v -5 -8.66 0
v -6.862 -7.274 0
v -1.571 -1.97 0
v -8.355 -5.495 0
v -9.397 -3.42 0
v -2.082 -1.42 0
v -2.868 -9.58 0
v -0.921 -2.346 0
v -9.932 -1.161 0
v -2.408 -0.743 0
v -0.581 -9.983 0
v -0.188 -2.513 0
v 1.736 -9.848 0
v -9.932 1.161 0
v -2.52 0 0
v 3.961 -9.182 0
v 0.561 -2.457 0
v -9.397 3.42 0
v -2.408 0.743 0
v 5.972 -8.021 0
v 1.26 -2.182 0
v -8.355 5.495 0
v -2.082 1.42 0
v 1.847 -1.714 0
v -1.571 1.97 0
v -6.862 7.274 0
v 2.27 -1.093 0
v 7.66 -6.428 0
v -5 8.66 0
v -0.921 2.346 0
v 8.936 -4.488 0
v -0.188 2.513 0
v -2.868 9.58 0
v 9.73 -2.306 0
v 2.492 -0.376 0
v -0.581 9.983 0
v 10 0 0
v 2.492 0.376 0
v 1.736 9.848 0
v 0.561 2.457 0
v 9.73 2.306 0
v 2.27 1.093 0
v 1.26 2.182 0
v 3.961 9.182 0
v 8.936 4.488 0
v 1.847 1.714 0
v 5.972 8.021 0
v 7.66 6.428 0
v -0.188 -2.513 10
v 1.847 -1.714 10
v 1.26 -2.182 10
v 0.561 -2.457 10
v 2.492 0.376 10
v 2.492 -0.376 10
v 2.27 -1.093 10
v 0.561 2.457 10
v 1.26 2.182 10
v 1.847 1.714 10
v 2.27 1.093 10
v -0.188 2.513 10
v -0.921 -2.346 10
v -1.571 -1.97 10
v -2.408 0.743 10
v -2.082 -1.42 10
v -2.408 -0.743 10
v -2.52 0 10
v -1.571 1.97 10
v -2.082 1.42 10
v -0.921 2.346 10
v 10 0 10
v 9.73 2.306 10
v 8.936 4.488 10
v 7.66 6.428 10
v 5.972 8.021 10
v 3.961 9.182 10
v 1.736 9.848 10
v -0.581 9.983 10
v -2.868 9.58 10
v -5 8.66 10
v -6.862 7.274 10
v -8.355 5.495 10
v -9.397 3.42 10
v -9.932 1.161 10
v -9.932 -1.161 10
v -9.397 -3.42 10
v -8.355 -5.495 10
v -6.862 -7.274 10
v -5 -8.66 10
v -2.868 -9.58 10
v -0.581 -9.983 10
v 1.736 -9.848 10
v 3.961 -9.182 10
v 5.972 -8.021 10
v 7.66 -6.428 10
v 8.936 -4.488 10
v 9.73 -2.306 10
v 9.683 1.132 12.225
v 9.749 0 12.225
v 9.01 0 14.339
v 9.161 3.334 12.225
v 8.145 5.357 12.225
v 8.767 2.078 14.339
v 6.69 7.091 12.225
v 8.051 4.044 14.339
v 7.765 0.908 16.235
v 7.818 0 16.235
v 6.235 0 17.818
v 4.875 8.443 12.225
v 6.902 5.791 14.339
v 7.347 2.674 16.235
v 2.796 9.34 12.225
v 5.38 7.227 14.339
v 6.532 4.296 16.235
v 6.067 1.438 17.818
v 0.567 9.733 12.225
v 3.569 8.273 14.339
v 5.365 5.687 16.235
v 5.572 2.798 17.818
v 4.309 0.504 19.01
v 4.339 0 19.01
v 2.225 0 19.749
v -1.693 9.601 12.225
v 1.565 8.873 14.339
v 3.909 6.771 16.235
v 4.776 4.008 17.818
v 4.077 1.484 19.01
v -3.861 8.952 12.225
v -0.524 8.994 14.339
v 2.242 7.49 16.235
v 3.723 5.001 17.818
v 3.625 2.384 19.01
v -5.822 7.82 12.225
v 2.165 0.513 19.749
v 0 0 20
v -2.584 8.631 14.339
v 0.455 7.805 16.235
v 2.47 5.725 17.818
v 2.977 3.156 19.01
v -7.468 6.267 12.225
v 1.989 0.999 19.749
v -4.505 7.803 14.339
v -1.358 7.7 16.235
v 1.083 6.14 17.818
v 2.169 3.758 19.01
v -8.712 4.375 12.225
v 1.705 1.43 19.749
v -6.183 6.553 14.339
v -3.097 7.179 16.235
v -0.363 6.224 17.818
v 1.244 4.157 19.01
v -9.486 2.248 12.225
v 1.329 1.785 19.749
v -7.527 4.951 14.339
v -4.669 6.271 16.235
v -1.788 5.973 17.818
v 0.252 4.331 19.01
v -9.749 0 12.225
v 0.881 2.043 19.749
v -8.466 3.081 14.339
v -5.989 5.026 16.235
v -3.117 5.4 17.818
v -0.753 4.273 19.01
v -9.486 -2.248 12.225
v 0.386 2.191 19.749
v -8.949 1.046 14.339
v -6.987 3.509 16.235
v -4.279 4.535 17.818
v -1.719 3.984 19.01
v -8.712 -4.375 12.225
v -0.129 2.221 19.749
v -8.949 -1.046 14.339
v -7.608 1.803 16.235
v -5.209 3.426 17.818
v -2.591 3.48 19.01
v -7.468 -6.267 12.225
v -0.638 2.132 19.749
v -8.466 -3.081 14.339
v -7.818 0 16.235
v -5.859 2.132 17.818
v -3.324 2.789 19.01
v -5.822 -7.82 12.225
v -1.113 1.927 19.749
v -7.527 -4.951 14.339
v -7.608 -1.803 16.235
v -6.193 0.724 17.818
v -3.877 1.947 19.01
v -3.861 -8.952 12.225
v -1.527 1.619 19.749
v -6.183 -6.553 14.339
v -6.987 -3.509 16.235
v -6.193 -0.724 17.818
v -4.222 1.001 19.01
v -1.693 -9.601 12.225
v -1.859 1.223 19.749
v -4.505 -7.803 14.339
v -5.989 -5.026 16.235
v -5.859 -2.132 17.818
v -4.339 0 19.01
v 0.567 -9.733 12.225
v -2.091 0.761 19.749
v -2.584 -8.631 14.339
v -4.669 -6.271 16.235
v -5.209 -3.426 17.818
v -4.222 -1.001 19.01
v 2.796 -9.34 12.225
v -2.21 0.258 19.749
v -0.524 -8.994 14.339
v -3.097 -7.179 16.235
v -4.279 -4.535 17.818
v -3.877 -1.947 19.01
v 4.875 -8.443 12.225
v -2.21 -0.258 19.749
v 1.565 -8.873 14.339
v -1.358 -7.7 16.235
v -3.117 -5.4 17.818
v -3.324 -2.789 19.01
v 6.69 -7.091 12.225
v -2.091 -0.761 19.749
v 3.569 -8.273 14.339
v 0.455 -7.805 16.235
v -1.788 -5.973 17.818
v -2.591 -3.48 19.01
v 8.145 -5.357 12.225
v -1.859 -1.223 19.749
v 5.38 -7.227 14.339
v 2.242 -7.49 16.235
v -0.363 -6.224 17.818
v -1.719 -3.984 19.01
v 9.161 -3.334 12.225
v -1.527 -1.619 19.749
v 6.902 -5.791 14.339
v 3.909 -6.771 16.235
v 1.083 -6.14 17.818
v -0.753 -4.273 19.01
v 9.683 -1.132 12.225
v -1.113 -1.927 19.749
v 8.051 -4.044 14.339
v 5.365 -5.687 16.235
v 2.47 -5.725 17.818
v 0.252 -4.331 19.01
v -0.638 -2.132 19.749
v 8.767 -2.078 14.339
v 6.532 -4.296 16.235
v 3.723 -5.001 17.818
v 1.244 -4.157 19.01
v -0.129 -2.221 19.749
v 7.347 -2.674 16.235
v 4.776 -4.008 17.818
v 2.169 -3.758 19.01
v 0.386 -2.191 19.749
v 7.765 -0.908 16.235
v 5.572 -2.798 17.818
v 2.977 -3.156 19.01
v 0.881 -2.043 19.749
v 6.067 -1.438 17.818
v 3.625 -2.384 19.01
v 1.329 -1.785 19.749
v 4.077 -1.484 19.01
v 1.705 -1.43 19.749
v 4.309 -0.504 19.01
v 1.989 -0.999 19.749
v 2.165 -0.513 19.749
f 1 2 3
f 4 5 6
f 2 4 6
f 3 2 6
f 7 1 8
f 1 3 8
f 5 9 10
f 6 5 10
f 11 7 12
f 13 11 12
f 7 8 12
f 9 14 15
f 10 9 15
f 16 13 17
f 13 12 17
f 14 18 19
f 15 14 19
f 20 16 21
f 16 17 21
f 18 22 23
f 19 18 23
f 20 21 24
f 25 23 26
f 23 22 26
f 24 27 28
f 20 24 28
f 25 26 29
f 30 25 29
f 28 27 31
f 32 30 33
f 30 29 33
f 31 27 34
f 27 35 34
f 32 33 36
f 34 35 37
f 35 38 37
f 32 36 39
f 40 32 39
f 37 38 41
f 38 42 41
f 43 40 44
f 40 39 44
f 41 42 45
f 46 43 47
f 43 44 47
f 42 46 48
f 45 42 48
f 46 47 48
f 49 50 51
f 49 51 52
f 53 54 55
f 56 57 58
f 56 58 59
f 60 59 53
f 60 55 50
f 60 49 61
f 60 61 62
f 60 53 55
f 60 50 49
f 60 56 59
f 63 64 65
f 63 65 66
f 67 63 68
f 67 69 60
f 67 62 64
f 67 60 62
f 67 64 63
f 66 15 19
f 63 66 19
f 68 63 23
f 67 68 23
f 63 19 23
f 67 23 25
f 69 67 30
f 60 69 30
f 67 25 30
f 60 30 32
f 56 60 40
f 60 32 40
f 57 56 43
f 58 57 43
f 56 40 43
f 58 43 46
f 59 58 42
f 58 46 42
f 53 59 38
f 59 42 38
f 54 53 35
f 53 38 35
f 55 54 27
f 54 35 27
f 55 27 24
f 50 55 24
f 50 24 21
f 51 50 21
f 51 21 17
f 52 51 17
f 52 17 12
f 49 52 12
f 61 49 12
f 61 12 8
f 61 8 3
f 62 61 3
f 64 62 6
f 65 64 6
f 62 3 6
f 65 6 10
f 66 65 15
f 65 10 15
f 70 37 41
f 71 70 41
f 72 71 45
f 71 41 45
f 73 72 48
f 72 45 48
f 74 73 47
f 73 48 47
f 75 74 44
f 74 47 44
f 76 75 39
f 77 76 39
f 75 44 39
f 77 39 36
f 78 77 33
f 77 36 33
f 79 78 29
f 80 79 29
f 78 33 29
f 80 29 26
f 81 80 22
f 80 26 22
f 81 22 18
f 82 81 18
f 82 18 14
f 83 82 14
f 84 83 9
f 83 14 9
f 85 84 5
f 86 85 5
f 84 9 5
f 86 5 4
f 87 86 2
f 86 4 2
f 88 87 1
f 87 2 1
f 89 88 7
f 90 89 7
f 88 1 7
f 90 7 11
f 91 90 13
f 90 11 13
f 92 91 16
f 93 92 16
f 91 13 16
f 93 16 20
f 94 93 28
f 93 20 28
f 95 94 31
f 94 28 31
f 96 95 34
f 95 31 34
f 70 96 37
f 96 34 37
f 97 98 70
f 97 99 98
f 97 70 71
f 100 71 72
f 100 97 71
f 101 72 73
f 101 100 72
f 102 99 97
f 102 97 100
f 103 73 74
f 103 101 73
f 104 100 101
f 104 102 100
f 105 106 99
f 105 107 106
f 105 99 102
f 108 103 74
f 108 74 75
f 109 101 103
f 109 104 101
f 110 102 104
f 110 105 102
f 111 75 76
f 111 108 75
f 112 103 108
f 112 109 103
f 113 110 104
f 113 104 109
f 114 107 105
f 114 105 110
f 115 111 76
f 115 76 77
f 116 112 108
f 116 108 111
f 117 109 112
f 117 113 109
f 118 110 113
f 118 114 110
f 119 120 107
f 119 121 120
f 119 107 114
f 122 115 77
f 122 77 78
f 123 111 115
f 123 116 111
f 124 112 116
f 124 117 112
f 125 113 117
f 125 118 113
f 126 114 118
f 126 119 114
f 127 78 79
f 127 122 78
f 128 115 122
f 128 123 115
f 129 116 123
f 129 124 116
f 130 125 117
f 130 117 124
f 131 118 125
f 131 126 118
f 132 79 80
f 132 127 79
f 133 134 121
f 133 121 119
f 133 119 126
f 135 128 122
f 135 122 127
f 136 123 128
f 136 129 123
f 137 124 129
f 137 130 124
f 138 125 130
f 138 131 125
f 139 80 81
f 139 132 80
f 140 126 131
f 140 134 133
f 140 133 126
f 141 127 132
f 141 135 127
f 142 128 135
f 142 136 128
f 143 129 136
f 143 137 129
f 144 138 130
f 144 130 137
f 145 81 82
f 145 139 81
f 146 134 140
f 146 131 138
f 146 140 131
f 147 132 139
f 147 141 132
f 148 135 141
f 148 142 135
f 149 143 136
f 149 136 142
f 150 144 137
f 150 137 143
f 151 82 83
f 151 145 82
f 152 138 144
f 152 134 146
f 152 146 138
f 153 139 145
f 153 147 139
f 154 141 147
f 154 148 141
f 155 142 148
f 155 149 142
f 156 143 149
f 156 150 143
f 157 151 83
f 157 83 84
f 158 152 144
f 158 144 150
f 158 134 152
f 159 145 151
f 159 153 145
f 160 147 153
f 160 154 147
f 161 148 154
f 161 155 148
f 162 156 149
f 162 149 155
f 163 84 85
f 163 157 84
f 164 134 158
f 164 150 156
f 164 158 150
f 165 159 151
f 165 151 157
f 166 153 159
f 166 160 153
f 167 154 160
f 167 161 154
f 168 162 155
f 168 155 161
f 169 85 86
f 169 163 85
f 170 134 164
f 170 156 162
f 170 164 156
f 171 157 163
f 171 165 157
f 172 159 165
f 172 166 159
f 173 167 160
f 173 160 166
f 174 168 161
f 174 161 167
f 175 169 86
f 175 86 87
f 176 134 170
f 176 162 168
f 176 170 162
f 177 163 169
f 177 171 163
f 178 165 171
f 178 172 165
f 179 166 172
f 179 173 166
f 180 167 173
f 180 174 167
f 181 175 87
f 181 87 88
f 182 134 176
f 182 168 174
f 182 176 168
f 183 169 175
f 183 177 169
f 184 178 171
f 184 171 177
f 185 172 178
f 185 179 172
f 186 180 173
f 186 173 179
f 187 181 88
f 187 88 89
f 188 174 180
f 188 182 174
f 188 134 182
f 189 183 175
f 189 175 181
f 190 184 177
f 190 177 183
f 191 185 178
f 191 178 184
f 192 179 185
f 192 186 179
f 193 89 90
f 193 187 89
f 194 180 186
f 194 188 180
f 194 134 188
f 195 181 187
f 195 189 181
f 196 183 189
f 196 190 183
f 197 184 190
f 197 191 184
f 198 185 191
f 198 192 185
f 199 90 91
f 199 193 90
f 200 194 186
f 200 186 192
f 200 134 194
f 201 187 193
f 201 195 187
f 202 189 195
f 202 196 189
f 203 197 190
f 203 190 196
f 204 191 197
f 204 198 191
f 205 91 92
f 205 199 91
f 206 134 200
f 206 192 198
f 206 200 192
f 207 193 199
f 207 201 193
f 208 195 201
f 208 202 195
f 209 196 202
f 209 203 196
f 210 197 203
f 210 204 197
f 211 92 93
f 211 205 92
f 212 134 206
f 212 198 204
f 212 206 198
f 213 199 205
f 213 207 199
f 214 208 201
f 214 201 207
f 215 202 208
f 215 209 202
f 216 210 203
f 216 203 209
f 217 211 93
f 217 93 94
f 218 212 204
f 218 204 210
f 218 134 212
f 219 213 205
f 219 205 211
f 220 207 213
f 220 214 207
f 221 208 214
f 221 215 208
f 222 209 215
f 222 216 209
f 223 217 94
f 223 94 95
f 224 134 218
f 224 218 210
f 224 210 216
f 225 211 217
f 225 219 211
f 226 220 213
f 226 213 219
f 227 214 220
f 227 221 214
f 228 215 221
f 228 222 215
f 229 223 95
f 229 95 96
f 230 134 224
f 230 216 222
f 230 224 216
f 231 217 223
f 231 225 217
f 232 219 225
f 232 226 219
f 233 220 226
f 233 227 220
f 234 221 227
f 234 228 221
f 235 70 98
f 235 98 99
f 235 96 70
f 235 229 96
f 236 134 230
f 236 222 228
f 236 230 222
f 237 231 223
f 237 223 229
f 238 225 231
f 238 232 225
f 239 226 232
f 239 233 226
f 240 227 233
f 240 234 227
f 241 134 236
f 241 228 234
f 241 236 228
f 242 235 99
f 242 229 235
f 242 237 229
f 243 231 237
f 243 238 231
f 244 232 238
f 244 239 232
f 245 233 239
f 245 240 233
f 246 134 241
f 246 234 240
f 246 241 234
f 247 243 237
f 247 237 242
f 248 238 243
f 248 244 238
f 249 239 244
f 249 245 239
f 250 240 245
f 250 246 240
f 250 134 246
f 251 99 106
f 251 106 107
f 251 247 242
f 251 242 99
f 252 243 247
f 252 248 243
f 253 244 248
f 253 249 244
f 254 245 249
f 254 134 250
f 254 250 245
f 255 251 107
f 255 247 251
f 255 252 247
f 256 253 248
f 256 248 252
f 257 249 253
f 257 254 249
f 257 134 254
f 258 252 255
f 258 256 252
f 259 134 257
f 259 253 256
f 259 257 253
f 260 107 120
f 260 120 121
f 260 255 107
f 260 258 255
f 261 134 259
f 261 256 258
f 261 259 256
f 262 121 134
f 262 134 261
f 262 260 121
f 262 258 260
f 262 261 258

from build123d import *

# Parameters (mm, degrees)
ESQUISSE1_R             = 10
BOSS_EXTRU_1_DEPTH      = 10
D_ME1_FACE_RADIUS       = 10
D_ME1_HEIGHT            = 10
ESQUISSE2_R             = 2.52
ENL_V_MAT_EXTRU_1_DEPTH = 10


with BuildPart() as part:
    # Esquisse1 → Boss.-Extru.1 (new body)
    with BuildSketch(Plane.XY):
        Circle(ESQUISSE1_R)
    extrude(amount=BOSS_EXTRU_1_DEPTH)

    # Dôme1: a dome of height H over a round flat face of radius A is a cap of a sphere of radius (A * A + H * H) / (2 * H)
    d_me1_r = (D_ME1_FACE_RADIUS * D_ME1_FACE_RADIUS + D_ME1_HEIGHT * D_ME1_HEIGHT) / (2 * D_ME1_HEIGHT)
    d_me1_base = Plane((0, 0, 10), z_dir=(0, 0, 1))
    with Locations(d_me1_base.offset(D_ME1_HEIGHT - d_me1_r)):
        d_me1_ball = Sphere(d_me1_r, mode=Mode.PRIVATE)
    add(split(d_me1_ball, bisect_by=d_me1_base, keep=Keep.TOP, mode=Mode.PRIVATE))

    # Esquisse2 → Enlèv. mat.-Extru.1 (cut)
    with BuildSketch(Plane(origin=(0, 0, 0), x_dir=(-1, 0, 0), z_dir=(0, 0, -1))):
        Circle(ESQUISSE2_R)
    extrude(amount=-ENL_V_MAT_EXTRU_1_DEPTH, mode=Mode.SUBTRACT)


solid = part.part
